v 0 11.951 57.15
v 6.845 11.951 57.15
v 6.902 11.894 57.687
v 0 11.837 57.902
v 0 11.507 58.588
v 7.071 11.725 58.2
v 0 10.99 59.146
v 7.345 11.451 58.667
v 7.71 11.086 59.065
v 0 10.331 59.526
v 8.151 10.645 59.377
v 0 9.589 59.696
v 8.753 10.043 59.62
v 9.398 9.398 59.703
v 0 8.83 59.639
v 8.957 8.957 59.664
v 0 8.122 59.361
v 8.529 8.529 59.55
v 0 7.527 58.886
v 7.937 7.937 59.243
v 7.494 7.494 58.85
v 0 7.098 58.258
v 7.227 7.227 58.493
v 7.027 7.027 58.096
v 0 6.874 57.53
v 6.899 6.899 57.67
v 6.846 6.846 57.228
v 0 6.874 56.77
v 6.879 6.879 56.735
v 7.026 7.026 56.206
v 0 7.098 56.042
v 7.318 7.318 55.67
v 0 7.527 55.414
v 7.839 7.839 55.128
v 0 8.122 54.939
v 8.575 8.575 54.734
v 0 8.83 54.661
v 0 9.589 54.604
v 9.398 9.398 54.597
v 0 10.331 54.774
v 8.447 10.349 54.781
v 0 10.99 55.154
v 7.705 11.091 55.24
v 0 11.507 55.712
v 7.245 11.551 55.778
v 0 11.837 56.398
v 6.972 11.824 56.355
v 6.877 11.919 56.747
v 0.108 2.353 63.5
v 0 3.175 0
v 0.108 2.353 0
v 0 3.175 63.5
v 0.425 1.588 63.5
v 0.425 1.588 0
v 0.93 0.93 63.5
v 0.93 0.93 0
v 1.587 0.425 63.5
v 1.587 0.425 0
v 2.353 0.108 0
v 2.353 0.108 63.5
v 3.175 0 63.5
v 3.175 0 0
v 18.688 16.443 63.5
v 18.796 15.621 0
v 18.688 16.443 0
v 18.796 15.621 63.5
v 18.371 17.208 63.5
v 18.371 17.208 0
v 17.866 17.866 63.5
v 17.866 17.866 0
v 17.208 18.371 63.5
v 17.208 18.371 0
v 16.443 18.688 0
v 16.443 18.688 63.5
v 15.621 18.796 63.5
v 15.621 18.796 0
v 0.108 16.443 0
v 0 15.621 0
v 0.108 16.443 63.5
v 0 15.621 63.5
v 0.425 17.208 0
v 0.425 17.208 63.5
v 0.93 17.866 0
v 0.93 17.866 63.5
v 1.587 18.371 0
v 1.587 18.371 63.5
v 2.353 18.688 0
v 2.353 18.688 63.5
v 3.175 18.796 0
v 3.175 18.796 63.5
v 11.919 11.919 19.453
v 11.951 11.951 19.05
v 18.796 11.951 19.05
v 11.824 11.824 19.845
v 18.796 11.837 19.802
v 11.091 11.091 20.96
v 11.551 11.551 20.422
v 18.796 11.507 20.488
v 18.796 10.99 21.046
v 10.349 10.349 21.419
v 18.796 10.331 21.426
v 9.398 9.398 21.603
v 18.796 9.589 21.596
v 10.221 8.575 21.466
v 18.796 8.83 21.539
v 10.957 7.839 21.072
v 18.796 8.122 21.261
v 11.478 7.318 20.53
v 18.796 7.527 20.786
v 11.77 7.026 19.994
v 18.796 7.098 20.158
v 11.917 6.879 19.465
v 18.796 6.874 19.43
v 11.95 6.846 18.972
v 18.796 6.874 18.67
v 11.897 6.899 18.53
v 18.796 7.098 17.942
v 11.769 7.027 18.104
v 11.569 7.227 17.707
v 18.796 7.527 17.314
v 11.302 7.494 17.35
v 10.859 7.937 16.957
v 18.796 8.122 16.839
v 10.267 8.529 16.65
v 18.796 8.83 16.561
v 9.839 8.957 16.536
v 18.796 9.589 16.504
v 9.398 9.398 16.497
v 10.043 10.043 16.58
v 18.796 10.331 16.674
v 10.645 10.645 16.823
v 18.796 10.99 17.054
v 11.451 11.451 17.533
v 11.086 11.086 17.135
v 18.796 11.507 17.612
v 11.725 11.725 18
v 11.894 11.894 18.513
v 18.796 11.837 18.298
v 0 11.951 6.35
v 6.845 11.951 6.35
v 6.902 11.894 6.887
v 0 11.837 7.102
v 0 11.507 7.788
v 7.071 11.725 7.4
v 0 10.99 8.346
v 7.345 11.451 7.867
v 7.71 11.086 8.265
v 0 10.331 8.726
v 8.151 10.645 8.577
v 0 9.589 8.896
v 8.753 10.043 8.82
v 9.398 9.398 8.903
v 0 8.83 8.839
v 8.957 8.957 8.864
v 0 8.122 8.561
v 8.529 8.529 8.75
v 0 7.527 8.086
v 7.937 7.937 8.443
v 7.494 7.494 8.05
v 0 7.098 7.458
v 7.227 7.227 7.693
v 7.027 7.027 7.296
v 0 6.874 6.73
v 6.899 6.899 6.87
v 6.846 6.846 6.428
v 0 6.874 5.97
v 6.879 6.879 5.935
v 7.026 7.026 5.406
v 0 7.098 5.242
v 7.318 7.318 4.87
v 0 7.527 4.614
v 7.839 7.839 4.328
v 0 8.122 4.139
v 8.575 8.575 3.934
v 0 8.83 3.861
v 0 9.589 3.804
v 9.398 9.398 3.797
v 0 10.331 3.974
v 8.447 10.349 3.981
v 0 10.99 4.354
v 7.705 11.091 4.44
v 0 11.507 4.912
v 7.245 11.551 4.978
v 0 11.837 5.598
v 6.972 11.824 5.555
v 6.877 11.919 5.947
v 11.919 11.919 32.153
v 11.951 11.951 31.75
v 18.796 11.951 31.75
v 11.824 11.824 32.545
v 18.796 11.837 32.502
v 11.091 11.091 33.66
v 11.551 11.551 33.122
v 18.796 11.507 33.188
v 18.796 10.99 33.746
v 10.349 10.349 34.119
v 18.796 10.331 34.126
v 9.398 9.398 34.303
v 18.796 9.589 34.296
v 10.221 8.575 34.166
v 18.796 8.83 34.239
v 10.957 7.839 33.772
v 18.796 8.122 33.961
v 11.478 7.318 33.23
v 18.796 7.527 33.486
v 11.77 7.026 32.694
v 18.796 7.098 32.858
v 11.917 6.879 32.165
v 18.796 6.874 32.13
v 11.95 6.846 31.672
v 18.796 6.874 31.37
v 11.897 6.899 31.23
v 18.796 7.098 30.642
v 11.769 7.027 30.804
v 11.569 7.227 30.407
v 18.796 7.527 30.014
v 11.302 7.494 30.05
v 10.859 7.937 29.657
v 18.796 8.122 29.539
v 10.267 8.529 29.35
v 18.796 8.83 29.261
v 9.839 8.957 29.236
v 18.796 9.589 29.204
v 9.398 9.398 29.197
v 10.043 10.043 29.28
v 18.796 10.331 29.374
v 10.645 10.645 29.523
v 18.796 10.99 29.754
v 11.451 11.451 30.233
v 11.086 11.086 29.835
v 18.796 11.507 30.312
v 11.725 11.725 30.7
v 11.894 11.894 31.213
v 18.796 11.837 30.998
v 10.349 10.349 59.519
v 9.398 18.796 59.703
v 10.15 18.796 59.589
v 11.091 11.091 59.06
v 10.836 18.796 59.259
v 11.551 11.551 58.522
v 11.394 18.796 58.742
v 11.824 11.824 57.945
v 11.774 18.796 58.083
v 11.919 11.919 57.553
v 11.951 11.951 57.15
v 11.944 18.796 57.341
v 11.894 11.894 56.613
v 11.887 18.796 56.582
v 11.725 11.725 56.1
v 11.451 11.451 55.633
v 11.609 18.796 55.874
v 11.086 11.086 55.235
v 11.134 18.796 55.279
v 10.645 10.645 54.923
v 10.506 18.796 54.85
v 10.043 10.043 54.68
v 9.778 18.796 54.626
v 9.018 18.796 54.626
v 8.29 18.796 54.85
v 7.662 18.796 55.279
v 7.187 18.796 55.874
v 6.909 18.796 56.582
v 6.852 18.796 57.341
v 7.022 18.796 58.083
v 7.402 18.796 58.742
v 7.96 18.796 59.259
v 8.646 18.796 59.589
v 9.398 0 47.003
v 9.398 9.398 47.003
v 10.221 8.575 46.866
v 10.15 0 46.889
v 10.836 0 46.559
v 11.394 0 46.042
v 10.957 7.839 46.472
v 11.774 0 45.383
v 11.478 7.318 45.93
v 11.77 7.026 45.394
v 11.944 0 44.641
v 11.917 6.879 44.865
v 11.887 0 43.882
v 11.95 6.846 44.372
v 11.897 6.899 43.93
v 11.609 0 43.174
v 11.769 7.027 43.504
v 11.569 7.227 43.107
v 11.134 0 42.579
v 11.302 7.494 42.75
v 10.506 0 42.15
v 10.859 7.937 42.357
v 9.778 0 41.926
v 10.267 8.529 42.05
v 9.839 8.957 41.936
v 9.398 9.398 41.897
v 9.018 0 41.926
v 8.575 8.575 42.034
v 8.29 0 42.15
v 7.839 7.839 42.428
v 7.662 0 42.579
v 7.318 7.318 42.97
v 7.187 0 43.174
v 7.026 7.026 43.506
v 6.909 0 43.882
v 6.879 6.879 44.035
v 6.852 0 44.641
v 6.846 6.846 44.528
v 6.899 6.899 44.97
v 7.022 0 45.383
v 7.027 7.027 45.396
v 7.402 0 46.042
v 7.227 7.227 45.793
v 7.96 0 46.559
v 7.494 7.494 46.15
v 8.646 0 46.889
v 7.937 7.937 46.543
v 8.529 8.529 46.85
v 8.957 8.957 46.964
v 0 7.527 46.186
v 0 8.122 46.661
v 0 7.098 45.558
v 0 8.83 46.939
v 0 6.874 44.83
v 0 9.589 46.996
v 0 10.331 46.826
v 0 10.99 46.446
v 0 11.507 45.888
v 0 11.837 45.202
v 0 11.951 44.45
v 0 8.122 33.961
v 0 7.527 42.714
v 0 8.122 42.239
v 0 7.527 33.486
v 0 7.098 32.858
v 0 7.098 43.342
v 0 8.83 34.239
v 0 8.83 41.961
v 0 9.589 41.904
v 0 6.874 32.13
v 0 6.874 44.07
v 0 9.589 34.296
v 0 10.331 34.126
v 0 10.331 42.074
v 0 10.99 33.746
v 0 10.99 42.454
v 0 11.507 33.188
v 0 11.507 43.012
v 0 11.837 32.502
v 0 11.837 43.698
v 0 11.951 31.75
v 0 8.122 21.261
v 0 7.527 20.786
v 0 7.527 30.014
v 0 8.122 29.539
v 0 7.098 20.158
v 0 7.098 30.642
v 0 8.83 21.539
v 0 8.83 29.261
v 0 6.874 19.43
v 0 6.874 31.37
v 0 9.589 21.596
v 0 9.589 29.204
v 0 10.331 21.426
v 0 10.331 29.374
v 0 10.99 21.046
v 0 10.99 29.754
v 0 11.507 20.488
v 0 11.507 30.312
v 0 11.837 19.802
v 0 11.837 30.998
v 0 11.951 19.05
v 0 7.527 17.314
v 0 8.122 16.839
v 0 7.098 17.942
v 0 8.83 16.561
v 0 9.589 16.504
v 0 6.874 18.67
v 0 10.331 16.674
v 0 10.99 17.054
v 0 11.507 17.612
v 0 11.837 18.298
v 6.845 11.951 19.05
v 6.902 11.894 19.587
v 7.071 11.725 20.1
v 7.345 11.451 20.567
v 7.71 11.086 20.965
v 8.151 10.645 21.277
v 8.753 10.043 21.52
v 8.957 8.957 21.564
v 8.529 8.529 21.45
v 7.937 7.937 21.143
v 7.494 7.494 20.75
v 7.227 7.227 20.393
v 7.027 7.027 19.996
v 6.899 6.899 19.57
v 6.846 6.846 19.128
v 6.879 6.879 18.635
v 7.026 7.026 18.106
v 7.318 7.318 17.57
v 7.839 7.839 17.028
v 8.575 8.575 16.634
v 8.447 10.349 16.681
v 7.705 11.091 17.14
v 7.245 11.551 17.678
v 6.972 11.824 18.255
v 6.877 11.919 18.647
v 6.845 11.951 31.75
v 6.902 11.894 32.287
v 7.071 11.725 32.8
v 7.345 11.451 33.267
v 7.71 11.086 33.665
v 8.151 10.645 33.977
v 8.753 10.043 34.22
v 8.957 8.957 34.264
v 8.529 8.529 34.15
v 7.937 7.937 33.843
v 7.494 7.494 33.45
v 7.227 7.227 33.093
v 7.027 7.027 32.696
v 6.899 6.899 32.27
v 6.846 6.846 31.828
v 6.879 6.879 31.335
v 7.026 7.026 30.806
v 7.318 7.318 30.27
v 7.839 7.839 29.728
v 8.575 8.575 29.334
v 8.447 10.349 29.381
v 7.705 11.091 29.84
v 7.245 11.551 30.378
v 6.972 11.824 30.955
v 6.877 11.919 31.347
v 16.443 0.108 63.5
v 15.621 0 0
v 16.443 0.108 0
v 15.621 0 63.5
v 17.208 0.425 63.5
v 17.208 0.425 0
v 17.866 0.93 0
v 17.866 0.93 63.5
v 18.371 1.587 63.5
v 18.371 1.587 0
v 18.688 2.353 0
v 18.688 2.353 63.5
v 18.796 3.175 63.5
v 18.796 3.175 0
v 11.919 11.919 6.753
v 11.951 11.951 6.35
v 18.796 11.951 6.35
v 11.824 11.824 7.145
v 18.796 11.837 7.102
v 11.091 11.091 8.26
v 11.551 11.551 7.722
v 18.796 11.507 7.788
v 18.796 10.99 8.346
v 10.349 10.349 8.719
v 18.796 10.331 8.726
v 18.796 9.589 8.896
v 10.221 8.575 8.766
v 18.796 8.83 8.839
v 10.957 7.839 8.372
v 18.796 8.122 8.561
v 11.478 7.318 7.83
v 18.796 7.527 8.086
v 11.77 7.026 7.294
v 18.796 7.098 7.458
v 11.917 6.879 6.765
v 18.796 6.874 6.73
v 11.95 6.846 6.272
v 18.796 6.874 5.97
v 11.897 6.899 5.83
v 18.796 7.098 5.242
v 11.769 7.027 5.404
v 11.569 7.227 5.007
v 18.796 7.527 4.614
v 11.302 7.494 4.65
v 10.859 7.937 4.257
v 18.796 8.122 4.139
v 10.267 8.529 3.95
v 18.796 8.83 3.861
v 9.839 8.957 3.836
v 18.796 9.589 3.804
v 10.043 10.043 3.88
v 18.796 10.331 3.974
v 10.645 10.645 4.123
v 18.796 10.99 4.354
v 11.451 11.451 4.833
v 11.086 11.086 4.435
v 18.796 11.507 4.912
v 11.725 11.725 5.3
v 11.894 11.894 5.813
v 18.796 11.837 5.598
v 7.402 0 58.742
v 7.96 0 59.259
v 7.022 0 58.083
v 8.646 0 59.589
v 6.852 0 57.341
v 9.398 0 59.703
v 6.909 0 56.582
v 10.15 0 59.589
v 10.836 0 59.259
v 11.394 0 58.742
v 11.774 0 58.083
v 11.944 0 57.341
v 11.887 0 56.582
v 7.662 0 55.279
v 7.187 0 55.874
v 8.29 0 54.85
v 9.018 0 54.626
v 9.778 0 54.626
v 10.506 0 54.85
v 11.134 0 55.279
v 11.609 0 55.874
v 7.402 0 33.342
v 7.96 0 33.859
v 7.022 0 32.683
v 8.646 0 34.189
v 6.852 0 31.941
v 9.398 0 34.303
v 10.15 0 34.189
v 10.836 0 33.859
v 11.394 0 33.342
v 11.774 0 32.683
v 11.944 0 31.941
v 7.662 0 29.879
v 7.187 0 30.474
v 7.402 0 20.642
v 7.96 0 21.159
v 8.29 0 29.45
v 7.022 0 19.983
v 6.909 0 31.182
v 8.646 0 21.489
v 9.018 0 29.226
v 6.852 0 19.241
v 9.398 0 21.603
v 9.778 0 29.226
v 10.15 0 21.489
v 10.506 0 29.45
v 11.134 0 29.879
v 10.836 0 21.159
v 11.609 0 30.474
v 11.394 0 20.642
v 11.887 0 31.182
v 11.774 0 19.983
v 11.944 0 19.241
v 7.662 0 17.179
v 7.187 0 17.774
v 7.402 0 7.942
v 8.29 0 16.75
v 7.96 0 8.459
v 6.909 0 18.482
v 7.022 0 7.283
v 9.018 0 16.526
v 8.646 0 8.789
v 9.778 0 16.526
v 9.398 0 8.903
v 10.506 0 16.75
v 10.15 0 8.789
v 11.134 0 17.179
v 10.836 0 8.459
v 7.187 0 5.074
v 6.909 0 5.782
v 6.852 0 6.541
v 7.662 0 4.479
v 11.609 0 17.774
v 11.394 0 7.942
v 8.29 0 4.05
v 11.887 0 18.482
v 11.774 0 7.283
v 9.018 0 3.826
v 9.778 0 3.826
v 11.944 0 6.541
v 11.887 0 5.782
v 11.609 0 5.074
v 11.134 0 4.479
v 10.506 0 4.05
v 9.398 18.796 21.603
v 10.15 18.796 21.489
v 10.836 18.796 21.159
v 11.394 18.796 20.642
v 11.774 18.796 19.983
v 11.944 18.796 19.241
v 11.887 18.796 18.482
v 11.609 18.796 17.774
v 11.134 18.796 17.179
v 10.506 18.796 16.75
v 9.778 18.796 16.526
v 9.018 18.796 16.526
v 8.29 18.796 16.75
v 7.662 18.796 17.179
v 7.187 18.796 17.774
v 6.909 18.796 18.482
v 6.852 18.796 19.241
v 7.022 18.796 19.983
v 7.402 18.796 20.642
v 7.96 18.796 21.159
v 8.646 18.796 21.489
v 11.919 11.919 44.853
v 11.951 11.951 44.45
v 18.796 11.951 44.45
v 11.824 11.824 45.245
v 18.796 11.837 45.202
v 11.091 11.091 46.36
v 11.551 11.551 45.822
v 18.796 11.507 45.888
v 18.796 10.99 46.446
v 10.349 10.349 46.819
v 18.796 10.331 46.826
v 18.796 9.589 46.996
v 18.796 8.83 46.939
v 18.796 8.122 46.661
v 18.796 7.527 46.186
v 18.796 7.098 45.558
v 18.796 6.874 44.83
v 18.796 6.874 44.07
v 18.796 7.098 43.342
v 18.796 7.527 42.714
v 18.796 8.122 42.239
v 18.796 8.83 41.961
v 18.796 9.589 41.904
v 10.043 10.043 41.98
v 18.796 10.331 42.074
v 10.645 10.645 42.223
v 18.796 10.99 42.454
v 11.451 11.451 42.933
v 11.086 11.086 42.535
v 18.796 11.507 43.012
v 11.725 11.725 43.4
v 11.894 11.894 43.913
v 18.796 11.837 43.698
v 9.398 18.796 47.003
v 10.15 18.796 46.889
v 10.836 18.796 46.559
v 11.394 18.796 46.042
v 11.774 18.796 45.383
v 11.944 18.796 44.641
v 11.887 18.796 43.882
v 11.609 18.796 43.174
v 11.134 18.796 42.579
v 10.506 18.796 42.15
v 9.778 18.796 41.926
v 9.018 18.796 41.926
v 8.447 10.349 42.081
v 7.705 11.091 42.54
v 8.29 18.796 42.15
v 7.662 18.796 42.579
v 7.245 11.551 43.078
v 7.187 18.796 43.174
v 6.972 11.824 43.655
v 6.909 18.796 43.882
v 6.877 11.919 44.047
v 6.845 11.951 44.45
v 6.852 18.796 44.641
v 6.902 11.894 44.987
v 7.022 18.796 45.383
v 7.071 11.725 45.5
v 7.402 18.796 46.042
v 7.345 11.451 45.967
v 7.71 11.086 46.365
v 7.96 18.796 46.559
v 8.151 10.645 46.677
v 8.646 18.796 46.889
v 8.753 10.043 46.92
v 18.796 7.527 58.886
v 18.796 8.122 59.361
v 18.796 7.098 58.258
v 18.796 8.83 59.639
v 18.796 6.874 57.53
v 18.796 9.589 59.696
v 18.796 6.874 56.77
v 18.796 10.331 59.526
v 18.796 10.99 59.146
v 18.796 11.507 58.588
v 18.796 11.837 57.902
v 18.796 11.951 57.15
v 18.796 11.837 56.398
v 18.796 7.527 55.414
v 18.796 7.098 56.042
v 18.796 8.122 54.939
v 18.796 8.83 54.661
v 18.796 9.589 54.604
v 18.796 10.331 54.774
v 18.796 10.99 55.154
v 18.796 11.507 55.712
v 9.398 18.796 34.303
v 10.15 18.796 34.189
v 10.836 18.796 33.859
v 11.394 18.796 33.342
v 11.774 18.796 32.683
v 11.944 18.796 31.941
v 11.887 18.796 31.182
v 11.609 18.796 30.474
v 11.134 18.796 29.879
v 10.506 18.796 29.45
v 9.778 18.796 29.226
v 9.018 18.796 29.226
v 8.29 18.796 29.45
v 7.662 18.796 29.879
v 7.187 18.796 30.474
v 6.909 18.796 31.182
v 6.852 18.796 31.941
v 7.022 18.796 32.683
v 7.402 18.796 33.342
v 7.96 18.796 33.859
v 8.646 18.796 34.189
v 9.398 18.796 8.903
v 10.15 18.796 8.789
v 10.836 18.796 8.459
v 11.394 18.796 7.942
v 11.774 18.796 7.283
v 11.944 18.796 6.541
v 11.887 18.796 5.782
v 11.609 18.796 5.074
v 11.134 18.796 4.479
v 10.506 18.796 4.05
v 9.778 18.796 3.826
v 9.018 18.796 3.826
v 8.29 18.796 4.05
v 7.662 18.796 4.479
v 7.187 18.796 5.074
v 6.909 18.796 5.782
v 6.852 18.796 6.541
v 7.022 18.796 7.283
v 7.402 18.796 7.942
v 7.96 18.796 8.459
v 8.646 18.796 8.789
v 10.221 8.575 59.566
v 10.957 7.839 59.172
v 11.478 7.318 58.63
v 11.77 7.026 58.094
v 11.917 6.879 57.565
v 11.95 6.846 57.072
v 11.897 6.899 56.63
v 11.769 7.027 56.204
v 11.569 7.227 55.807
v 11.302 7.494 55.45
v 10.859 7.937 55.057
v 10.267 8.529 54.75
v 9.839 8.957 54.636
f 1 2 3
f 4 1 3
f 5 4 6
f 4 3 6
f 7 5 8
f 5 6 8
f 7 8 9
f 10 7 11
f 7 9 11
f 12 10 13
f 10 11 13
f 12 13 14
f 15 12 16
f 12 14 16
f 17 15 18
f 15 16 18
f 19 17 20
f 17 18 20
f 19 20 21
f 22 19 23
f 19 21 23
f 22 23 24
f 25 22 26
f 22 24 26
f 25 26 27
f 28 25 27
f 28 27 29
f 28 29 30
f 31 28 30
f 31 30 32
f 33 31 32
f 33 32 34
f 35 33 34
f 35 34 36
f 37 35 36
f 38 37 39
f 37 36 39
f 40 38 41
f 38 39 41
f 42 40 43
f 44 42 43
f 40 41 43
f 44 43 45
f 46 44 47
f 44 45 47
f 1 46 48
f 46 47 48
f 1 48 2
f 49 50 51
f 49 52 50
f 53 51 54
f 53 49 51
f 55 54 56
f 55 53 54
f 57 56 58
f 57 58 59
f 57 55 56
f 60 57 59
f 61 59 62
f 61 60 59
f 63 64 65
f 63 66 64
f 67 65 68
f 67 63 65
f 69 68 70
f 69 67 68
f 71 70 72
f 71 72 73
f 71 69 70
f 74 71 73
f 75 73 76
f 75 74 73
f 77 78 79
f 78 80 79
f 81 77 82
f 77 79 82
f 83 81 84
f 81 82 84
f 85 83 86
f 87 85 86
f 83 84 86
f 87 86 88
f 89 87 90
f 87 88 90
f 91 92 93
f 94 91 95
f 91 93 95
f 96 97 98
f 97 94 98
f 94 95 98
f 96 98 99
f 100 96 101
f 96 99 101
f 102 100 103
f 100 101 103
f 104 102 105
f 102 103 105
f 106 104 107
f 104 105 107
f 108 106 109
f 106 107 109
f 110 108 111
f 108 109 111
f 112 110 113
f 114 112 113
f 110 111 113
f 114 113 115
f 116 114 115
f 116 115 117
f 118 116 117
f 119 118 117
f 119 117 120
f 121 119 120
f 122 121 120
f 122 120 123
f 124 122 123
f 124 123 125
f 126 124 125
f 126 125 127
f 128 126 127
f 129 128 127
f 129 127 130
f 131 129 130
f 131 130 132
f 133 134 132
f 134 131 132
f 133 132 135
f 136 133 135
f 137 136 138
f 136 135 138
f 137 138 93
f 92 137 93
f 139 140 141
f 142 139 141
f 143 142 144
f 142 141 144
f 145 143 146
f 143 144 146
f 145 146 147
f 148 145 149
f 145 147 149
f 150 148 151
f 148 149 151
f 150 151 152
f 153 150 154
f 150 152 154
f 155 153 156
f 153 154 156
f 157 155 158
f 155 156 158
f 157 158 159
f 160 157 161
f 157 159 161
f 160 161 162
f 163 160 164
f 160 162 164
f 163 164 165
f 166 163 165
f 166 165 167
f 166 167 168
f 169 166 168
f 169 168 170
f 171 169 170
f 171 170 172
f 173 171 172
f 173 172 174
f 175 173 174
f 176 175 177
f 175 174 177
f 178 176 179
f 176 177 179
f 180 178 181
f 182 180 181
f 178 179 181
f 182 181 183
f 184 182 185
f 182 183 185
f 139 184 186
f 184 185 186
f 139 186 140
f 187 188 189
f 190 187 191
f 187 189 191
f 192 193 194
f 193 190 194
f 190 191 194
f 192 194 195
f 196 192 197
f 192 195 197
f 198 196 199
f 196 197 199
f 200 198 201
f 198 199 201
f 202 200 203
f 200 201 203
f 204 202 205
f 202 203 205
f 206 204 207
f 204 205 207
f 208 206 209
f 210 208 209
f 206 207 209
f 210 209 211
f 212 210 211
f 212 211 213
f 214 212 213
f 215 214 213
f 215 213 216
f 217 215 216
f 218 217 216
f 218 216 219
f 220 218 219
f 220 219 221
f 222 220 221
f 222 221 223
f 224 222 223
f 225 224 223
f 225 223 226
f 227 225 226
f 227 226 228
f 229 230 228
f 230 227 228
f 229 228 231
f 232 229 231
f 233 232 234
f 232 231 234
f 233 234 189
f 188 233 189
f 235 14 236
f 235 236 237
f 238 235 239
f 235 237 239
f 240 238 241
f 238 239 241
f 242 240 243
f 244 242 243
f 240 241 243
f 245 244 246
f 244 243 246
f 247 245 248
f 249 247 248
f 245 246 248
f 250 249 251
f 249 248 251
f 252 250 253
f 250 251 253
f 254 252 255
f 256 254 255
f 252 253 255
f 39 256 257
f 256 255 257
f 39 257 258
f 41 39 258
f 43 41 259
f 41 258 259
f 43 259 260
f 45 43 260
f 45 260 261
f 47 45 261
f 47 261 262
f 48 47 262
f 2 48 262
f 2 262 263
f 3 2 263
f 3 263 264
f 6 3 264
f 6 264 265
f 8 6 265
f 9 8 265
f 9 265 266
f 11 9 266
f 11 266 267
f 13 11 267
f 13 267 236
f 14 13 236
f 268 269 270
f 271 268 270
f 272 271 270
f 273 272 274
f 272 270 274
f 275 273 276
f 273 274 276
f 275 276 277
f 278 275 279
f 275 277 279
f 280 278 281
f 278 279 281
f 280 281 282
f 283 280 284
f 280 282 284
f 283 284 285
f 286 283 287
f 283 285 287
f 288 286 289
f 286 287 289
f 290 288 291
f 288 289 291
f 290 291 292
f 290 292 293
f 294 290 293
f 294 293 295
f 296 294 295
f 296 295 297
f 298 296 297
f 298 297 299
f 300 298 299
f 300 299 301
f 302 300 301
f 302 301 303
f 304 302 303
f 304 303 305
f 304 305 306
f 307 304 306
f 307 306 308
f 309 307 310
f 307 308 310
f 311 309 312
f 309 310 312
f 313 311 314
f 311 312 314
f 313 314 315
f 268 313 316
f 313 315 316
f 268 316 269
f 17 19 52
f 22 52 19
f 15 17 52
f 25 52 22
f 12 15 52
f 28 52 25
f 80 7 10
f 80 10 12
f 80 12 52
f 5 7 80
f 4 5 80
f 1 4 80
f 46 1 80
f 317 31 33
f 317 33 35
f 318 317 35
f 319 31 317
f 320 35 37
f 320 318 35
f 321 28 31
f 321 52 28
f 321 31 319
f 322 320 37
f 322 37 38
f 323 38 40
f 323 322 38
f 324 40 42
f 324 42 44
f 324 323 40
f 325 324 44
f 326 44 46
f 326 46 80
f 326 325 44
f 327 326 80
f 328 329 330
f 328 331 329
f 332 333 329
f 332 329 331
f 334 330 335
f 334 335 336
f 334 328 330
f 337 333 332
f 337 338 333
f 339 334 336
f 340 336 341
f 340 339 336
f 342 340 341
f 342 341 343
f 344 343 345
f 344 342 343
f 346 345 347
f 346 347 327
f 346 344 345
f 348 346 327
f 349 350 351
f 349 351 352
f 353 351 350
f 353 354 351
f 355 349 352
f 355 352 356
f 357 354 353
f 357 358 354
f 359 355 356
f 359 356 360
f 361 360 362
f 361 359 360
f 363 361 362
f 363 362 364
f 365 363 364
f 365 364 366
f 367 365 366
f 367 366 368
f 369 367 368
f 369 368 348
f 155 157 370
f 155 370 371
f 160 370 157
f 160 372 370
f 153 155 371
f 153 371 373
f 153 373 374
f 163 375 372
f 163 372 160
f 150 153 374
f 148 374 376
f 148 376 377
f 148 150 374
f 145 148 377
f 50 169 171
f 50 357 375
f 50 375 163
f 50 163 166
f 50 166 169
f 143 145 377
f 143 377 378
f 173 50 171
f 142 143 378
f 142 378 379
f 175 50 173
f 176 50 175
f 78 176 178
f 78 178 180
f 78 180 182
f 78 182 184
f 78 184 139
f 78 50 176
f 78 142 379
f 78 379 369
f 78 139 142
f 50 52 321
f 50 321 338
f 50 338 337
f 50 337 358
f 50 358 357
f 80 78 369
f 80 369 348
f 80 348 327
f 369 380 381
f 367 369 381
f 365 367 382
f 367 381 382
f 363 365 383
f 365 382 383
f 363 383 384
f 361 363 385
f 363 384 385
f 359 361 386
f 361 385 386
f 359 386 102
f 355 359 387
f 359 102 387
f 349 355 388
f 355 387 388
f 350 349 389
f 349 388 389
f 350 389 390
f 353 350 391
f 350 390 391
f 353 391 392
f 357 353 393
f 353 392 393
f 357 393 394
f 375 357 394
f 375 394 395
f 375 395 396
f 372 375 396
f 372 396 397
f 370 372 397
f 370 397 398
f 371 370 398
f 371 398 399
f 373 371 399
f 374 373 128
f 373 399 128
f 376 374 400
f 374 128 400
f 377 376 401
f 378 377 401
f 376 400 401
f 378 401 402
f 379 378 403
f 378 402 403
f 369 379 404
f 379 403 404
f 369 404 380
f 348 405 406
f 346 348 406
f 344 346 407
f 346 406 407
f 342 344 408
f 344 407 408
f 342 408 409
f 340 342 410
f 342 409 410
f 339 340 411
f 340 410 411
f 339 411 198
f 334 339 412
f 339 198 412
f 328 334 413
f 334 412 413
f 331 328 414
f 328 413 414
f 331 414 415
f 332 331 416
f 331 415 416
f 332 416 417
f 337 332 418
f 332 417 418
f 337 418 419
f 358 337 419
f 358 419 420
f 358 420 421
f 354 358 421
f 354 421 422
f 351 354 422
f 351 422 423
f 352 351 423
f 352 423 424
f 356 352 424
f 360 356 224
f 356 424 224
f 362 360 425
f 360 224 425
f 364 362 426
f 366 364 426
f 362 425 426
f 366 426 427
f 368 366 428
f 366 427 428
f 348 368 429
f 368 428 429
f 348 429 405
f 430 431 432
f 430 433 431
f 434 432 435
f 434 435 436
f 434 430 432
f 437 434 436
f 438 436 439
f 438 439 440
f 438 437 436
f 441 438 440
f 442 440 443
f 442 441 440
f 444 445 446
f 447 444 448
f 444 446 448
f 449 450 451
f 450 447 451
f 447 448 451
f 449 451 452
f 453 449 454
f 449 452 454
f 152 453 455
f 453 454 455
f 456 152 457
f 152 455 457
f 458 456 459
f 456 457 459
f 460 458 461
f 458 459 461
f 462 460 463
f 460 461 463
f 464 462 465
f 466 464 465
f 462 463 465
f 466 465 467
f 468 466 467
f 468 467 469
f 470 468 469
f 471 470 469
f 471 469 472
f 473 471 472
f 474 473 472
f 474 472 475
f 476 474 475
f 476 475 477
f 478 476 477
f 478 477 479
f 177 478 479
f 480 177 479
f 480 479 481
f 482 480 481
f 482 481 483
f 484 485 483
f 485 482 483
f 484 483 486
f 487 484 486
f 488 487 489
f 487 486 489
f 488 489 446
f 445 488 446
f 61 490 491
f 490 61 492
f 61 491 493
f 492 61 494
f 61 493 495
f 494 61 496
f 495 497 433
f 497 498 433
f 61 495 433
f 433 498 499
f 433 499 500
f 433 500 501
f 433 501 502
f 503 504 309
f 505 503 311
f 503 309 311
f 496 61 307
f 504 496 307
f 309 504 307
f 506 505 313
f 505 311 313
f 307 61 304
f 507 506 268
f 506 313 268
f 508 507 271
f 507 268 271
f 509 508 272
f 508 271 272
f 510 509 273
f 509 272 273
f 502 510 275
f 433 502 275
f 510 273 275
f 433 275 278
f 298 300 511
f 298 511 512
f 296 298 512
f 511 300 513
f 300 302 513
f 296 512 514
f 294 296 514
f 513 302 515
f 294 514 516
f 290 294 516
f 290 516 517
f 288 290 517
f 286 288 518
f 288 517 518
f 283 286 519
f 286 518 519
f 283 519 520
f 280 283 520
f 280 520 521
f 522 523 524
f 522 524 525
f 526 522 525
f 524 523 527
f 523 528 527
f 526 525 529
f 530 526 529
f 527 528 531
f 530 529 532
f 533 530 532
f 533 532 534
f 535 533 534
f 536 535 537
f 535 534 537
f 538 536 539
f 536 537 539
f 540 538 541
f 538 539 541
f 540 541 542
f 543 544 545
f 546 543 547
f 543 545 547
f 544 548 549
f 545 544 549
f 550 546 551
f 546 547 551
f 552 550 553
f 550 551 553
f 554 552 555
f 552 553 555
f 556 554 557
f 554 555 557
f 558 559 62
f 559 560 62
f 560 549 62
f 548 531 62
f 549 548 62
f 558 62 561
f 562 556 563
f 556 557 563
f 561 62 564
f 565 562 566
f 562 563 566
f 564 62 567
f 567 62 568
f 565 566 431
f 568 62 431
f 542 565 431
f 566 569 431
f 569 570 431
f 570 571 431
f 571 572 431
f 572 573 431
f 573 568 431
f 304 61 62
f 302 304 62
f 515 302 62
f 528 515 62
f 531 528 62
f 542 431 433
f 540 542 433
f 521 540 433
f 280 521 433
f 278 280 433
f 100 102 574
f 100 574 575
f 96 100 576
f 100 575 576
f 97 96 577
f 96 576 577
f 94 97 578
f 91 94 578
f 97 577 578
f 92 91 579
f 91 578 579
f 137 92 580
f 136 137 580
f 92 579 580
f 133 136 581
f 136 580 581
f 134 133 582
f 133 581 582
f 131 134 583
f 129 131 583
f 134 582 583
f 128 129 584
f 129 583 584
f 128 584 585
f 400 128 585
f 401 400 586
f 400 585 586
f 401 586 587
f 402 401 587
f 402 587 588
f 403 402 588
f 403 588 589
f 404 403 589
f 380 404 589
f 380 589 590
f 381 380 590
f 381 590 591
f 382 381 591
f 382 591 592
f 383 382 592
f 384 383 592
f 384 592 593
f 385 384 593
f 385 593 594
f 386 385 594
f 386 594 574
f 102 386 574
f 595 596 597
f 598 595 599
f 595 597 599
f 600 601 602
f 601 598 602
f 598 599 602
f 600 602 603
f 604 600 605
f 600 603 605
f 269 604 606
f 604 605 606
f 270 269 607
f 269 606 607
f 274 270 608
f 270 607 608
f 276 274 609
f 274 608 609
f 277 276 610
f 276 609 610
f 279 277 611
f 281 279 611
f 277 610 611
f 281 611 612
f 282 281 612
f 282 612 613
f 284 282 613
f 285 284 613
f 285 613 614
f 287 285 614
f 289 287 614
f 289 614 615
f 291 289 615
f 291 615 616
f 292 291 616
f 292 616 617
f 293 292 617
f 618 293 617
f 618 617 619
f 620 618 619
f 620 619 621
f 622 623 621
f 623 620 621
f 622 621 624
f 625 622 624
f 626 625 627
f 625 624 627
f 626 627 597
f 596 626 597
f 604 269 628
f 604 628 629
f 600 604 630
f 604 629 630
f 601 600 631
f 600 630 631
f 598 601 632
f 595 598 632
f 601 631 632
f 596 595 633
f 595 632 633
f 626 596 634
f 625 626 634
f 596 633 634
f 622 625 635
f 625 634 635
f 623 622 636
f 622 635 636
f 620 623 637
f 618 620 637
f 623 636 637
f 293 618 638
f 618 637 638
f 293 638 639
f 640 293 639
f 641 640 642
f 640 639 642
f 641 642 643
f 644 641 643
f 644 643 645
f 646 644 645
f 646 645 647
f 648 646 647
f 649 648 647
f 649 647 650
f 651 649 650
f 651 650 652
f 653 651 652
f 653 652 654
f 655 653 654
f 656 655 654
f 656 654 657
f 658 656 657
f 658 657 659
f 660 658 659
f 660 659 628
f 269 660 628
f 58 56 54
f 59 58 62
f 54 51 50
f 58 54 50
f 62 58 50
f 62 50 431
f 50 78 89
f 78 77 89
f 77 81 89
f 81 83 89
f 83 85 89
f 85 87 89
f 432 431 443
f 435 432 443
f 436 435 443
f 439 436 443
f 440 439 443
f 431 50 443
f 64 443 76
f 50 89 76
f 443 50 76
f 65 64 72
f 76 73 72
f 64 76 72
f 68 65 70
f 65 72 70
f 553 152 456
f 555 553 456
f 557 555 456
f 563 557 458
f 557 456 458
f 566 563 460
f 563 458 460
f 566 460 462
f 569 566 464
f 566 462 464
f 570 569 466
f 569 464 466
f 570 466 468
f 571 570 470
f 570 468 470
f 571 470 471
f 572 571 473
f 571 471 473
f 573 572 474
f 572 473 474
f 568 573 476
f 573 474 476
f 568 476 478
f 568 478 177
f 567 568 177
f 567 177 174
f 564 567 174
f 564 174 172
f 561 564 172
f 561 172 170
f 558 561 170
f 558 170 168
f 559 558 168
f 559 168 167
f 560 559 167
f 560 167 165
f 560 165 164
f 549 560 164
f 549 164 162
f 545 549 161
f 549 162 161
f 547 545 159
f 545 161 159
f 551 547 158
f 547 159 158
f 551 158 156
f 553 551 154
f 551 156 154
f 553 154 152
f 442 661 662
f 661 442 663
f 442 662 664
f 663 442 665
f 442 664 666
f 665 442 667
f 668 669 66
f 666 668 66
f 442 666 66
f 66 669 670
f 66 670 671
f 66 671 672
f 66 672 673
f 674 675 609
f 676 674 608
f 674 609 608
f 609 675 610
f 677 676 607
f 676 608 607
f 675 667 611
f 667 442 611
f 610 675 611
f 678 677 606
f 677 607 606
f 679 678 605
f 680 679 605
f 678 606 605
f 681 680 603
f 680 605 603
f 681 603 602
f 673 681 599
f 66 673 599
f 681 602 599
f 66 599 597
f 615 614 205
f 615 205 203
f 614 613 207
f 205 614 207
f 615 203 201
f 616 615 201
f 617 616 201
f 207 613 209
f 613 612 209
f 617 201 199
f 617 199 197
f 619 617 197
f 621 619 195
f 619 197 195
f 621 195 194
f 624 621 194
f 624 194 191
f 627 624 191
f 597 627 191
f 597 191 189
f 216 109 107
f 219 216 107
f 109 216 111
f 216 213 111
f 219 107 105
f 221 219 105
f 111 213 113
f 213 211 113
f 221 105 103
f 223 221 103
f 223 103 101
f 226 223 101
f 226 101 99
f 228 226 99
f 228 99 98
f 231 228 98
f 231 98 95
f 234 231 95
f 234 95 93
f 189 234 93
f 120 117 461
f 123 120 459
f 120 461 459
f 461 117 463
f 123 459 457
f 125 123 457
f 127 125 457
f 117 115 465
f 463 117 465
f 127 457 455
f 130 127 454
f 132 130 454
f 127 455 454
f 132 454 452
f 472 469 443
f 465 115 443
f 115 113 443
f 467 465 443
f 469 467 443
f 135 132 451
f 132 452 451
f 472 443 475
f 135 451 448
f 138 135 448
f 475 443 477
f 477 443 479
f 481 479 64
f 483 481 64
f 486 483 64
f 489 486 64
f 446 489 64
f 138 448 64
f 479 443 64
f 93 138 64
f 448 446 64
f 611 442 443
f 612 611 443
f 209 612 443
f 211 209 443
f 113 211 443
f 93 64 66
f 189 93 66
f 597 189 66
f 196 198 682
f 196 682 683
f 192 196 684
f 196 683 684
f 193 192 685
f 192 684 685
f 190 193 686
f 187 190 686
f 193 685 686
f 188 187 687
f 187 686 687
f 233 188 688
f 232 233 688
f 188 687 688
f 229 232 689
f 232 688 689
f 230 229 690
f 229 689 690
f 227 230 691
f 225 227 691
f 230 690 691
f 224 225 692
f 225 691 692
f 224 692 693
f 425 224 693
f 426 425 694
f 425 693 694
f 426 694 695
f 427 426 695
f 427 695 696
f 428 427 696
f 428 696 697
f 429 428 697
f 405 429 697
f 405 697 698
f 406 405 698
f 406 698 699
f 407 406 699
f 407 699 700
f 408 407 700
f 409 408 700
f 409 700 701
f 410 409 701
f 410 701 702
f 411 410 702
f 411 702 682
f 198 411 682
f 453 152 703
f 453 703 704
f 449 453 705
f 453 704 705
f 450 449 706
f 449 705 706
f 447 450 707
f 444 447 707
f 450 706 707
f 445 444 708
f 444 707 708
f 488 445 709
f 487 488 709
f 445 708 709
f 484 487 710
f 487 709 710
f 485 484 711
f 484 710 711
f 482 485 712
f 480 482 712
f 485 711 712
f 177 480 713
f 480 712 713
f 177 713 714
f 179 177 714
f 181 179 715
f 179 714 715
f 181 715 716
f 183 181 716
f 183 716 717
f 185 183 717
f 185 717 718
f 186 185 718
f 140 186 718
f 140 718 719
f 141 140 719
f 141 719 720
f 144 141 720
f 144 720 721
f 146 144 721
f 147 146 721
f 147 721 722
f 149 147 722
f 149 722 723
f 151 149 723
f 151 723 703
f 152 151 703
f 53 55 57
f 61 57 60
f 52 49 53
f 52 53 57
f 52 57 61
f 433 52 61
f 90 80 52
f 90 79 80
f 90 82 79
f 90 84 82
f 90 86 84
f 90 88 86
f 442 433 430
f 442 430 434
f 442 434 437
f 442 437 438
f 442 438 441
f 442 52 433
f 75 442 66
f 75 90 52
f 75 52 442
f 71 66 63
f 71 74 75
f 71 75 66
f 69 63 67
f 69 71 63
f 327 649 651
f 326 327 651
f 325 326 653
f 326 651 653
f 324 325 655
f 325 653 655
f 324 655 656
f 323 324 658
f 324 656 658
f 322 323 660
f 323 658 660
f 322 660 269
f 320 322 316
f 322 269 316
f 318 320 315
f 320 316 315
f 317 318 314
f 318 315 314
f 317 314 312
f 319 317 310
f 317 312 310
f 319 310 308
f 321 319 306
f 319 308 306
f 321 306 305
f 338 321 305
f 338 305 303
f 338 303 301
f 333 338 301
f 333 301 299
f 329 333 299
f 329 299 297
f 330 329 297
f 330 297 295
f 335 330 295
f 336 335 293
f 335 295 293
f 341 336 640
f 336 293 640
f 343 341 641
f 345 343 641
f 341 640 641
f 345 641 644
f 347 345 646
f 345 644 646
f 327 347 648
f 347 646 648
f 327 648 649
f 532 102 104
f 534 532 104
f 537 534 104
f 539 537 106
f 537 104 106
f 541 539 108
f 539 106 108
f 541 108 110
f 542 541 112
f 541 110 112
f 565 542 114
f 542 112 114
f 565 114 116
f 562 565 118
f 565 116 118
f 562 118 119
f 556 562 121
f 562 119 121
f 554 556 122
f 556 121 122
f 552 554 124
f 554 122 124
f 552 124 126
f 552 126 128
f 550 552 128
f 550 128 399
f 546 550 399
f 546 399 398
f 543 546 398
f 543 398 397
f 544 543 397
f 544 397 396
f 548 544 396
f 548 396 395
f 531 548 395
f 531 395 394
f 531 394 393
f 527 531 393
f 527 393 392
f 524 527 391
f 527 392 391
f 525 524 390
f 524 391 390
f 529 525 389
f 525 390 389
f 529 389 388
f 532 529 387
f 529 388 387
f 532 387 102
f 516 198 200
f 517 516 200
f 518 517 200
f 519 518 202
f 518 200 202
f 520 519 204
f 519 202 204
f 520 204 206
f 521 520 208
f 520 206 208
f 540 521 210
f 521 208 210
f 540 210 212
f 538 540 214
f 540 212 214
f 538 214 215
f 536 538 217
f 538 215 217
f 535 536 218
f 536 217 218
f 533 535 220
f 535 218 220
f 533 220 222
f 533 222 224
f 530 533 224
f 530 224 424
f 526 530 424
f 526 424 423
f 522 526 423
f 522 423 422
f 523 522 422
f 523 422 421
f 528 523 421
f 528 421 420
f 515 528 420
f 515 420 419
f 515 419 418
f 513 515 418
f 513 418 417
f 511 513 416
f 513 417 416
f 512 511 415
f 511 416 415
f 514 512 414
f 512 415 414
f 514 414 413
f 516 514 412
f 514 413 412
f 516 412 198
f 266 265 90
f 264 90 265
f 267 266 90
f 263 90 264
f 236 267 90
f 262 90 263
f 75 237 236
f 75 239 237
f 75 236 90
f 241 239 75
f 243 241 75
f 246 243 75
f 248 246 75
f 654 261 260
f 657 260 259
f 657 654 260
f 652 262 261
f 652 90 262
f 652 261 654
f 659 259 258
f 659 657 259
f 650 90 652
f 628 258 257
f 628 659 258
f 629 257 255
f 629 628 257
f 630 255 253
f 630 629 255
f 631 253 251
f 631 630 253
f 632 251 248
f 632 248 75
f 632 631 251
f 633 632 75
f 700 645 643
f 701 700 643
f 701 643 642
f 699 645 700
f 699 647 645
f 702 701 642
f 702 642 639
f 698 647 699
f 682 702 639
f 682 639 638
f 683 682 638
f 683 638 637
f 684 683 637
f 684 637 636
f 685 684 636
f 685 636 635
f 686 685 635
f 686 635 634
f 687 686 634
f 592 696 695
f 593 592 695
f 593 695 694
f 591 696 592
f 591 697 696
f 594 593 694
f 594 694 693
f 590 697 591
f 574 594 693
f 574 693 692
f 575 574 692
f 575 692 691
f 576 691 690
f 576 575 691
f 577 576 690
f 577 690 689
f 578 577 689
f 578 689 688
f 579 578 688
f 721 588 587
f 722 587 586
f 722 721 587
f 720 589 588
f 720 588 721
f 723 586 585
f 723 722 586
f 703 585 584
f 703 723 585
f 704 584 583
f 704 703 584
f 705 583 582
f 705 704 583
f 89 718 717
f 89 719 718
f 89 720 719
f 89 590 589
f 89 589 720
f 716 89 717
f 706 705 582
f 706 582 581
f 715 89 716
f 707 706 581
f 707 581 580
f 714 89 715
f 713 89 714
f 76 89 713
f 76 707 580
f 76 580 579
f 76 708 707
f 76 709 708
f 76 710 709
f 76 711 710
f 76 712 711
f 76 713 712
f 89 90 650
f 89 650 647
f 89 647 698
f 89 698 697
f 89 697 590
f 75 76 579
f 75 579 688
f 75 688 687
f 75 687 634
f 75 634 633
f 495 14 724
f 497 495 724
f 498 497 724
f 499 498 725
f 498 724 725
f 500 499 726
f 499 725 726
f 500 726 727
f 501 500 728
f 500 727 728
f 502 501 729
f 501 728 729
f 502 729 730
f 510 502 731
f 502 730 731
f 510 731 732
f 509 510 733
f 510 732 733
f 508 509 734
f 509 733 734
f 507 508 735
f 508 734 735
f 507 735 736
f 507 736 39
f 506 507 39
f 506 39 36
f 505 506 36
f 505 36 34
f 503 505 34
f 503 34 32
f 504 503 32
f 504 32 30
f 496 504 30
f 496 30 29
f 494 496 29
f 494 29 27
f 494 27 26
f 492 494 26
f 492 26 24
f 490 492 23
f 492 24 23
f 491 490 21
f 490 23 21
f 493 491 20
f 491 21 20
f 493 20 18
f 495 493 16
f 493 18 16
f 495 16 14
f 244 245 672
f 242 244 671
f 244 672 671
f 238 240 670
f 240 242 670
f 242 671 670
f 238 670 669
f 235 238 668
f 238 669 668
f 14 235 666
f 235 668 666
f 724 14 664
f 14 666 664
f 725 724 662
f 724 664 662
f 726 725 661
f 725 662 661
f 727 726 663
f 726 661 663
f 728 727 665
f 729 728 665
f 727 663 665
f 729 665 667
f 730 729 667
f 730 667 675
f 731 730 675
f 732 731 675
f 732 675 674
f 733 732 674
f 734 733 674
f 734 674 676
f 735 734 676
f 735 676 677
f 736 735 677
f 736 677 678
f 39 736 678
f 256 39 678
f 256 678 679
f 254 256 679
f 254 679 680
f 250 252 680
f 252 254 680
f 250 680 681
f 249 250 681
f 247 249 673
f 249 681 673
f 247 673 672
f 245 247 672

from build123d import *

# Parameters (mm, degrees)
SKETCH1_W           = 18.796
SKETCH1_H           = 18.796
BOSS_EXTRUDE1_DEPTH = 63.5
FILLET1_R           = 3.175
SKETCH2_R           = 2.5527
CUT_EXTRUDE1_DEPTH  = 63.5
SKETCH3_R           = 2.5527
CUT_EXTRUDE2_DEPTH  = 63.5


with BuildPart() as part:
    # Sketch1 → Boss-Extrude1 (new body)
    with BuildSketch(Plane.XY):
        with Locations((9.398, 9.398)):
            Rectangle(SKETCH1_W, SKETCH1_H)
    extrude(amount=BOSS_EXTRUDE1_DEPTH)

    # Fillet1
    fillet1_edges = [part.edges().sort_by_distance(p)[0] for p in [
        (0, 18.796, 31.75),
        (18.796, 18.796, 31.75),
        (18.796, 0, 31.75),
        (0, 0, 31.75),
    ]]
    fillet(fillet1_edges, radius=FILLET1_R)

    # Sketch2 → Cut-Extrude1 (cut)
    with BuildSketch(Plane(origin=(0, 18.796, 0), x_dir=(1, 0, 0), z_dir=(0, 1, 0))):
        with Locations(Location((9.398, -6.35, 0), (0, 0, 270))):
            Circle(SKETCH2_R)
        with Locations(Location((9.398, -19.05, 0), (0, 0, 270))):
            Circle(SKETCH2_R)
        with Locations(Location((9.398, -31.75, 0), (0, 0, 270))):
            Circle(SKETCH2_R)
        with Locations(Location((9.398, -44.45, 0), (0, 0, 270))):
            Circle(SKETCH2_R)
        with Locations(Location((9.398, -57.15, 0), (0, 0, 270))):
            Circle(SKETCH2_R)
    extrude(amount=-CUT_EXTRUDE1_DEPTH, mode=Mode.SUBTRACT)

    # Sketch3 → Cut-Extrude2 (cut)
    with BuildSketch(Plane(origin=(18.796, 0, 0), x_dir=(0, 0, -1), z_dir=(1, 0, 0))):
        with Locations(Location((-57.15, 9.398, 0), (0, 0, 90))):
            Circle(SKETCH3_R)
        with Locations(Location((-44.45, 9.398, 0), (0, 0, 90))):
            Circle(SKETCH3_R)
        with Locations(Location((-31.75, 9.398, 0), (0, 0, 90))):
            Circle(SKETCH3_R)
        with Locations(Location((-19.05, 9.398, 0), (0, 0, 90))):
            Circle(SKETCH3_R)
        with Locations(Location((-6.35, 9.398, 0), (0, 0, 90))):
            Circle(SKETCH3_R)
    extrude(amount=-CUT_EXTRUDE2_DEPTH, mode=Mode.SUBTRACT)


solid = part.part
